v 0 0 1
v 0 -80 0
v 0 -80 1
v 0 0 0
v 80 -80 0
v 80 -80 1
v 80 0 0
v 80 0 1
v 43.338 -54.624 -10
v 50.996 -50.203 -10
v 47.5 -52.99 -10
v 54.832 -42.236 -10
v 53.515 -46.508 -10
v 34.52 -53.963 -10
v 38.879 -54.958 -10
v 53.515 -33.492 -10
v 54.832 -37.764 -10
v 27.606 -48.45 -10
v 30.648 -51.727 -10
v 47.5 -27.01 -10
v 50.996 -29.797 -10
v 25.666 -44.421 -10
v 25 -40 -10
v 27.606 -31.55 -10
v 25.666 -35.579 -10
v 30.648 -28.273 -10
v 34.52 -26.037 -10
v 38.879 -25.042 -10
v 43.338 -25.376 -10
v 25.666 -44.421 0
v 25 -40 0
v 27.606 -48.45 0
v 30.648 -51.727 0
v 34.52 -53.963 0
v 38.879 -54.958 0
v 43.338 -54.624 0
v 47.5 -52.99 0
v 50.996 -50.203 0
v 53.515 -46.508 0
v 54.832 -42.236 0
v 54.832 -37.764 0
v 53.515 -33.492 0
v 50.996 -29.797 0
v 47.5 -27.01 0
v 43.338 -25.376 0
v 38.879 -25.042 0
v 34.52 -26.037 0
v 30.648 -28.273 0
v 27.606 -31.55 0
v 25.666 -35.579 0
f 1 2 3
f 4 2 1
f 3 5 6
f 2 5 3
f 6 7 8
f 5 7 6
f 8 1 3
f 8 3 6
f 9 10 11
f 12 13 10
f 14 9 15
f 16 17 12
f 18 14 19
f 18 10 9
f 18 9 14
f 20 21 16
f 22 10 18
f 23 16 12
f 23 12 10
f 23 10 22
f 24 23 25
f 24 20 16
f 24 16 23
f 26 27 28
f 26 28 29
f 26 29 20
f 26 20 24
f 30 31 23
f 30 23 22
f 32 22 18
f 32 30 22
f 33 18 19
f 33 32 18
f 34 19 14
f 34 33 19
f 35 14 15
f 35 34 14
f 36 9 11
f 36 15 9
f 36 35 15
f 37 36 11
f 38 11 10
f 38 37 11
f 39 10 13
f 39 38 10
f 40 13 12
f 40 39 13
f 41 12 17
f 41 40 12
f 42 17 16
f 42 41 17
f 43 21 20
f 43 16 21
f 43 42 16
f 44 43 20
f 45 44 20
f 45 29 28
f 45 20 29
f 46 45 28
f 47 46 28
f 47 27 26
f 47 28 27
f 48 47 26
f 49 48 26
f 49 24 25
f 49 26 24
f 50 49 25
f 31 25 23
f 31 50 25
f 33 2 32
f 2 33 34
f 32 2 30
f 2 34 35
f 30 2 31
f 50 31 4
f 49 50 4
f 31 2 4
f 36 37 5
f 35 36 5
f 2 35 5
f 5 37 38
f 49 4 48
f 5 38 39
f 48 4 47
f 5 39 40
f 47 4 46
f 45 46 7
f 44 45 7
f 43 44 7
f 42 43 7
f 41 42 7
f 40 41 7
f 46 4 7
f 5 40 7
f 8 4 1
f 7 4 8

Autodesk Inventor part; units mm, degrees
ref_plane "YZ Plane" through (0, 0, 0) normal (1, 0, 0) x (0, 1, 0)
ref_plane "XZ Plane" through (0, 0, 0) normal (0, 1, 0) x (-1, 0, 0)
ref_plane "XY Plane" through (0, 0, 0) normal (0, 0, 1) x (1, 0, 0)
sketch "스케치1" plane through (0, 0, 0) normal (0, 0, 1) x (1, 0, 0)
  line L0 (0, 0) -> (80, 0)
  line L1 (80, 0) -> (80, -80)
  line L2 (80, -80) -> (0, -80)
  line L3 (0, -80) -> (0, 0)
  dimension "d0" = 80
  dimension "d1" = 80
extrude "돌출1" add sketch "스케치1" along normal blind 1
sketch "스케치2" plane through (0, 0, 0) normal (0, 0, -1) x (-1, 0, 0)
  circle A0 centre (-40, -40) radius 15
  point P0 (0, 0)
  dimension "d4" = 40
  dimension "d5" = 40
  dimension "d6" = 30
extrude "돌출2" add sketch "스케치2" along normal blind 10
properties part number "배경"
